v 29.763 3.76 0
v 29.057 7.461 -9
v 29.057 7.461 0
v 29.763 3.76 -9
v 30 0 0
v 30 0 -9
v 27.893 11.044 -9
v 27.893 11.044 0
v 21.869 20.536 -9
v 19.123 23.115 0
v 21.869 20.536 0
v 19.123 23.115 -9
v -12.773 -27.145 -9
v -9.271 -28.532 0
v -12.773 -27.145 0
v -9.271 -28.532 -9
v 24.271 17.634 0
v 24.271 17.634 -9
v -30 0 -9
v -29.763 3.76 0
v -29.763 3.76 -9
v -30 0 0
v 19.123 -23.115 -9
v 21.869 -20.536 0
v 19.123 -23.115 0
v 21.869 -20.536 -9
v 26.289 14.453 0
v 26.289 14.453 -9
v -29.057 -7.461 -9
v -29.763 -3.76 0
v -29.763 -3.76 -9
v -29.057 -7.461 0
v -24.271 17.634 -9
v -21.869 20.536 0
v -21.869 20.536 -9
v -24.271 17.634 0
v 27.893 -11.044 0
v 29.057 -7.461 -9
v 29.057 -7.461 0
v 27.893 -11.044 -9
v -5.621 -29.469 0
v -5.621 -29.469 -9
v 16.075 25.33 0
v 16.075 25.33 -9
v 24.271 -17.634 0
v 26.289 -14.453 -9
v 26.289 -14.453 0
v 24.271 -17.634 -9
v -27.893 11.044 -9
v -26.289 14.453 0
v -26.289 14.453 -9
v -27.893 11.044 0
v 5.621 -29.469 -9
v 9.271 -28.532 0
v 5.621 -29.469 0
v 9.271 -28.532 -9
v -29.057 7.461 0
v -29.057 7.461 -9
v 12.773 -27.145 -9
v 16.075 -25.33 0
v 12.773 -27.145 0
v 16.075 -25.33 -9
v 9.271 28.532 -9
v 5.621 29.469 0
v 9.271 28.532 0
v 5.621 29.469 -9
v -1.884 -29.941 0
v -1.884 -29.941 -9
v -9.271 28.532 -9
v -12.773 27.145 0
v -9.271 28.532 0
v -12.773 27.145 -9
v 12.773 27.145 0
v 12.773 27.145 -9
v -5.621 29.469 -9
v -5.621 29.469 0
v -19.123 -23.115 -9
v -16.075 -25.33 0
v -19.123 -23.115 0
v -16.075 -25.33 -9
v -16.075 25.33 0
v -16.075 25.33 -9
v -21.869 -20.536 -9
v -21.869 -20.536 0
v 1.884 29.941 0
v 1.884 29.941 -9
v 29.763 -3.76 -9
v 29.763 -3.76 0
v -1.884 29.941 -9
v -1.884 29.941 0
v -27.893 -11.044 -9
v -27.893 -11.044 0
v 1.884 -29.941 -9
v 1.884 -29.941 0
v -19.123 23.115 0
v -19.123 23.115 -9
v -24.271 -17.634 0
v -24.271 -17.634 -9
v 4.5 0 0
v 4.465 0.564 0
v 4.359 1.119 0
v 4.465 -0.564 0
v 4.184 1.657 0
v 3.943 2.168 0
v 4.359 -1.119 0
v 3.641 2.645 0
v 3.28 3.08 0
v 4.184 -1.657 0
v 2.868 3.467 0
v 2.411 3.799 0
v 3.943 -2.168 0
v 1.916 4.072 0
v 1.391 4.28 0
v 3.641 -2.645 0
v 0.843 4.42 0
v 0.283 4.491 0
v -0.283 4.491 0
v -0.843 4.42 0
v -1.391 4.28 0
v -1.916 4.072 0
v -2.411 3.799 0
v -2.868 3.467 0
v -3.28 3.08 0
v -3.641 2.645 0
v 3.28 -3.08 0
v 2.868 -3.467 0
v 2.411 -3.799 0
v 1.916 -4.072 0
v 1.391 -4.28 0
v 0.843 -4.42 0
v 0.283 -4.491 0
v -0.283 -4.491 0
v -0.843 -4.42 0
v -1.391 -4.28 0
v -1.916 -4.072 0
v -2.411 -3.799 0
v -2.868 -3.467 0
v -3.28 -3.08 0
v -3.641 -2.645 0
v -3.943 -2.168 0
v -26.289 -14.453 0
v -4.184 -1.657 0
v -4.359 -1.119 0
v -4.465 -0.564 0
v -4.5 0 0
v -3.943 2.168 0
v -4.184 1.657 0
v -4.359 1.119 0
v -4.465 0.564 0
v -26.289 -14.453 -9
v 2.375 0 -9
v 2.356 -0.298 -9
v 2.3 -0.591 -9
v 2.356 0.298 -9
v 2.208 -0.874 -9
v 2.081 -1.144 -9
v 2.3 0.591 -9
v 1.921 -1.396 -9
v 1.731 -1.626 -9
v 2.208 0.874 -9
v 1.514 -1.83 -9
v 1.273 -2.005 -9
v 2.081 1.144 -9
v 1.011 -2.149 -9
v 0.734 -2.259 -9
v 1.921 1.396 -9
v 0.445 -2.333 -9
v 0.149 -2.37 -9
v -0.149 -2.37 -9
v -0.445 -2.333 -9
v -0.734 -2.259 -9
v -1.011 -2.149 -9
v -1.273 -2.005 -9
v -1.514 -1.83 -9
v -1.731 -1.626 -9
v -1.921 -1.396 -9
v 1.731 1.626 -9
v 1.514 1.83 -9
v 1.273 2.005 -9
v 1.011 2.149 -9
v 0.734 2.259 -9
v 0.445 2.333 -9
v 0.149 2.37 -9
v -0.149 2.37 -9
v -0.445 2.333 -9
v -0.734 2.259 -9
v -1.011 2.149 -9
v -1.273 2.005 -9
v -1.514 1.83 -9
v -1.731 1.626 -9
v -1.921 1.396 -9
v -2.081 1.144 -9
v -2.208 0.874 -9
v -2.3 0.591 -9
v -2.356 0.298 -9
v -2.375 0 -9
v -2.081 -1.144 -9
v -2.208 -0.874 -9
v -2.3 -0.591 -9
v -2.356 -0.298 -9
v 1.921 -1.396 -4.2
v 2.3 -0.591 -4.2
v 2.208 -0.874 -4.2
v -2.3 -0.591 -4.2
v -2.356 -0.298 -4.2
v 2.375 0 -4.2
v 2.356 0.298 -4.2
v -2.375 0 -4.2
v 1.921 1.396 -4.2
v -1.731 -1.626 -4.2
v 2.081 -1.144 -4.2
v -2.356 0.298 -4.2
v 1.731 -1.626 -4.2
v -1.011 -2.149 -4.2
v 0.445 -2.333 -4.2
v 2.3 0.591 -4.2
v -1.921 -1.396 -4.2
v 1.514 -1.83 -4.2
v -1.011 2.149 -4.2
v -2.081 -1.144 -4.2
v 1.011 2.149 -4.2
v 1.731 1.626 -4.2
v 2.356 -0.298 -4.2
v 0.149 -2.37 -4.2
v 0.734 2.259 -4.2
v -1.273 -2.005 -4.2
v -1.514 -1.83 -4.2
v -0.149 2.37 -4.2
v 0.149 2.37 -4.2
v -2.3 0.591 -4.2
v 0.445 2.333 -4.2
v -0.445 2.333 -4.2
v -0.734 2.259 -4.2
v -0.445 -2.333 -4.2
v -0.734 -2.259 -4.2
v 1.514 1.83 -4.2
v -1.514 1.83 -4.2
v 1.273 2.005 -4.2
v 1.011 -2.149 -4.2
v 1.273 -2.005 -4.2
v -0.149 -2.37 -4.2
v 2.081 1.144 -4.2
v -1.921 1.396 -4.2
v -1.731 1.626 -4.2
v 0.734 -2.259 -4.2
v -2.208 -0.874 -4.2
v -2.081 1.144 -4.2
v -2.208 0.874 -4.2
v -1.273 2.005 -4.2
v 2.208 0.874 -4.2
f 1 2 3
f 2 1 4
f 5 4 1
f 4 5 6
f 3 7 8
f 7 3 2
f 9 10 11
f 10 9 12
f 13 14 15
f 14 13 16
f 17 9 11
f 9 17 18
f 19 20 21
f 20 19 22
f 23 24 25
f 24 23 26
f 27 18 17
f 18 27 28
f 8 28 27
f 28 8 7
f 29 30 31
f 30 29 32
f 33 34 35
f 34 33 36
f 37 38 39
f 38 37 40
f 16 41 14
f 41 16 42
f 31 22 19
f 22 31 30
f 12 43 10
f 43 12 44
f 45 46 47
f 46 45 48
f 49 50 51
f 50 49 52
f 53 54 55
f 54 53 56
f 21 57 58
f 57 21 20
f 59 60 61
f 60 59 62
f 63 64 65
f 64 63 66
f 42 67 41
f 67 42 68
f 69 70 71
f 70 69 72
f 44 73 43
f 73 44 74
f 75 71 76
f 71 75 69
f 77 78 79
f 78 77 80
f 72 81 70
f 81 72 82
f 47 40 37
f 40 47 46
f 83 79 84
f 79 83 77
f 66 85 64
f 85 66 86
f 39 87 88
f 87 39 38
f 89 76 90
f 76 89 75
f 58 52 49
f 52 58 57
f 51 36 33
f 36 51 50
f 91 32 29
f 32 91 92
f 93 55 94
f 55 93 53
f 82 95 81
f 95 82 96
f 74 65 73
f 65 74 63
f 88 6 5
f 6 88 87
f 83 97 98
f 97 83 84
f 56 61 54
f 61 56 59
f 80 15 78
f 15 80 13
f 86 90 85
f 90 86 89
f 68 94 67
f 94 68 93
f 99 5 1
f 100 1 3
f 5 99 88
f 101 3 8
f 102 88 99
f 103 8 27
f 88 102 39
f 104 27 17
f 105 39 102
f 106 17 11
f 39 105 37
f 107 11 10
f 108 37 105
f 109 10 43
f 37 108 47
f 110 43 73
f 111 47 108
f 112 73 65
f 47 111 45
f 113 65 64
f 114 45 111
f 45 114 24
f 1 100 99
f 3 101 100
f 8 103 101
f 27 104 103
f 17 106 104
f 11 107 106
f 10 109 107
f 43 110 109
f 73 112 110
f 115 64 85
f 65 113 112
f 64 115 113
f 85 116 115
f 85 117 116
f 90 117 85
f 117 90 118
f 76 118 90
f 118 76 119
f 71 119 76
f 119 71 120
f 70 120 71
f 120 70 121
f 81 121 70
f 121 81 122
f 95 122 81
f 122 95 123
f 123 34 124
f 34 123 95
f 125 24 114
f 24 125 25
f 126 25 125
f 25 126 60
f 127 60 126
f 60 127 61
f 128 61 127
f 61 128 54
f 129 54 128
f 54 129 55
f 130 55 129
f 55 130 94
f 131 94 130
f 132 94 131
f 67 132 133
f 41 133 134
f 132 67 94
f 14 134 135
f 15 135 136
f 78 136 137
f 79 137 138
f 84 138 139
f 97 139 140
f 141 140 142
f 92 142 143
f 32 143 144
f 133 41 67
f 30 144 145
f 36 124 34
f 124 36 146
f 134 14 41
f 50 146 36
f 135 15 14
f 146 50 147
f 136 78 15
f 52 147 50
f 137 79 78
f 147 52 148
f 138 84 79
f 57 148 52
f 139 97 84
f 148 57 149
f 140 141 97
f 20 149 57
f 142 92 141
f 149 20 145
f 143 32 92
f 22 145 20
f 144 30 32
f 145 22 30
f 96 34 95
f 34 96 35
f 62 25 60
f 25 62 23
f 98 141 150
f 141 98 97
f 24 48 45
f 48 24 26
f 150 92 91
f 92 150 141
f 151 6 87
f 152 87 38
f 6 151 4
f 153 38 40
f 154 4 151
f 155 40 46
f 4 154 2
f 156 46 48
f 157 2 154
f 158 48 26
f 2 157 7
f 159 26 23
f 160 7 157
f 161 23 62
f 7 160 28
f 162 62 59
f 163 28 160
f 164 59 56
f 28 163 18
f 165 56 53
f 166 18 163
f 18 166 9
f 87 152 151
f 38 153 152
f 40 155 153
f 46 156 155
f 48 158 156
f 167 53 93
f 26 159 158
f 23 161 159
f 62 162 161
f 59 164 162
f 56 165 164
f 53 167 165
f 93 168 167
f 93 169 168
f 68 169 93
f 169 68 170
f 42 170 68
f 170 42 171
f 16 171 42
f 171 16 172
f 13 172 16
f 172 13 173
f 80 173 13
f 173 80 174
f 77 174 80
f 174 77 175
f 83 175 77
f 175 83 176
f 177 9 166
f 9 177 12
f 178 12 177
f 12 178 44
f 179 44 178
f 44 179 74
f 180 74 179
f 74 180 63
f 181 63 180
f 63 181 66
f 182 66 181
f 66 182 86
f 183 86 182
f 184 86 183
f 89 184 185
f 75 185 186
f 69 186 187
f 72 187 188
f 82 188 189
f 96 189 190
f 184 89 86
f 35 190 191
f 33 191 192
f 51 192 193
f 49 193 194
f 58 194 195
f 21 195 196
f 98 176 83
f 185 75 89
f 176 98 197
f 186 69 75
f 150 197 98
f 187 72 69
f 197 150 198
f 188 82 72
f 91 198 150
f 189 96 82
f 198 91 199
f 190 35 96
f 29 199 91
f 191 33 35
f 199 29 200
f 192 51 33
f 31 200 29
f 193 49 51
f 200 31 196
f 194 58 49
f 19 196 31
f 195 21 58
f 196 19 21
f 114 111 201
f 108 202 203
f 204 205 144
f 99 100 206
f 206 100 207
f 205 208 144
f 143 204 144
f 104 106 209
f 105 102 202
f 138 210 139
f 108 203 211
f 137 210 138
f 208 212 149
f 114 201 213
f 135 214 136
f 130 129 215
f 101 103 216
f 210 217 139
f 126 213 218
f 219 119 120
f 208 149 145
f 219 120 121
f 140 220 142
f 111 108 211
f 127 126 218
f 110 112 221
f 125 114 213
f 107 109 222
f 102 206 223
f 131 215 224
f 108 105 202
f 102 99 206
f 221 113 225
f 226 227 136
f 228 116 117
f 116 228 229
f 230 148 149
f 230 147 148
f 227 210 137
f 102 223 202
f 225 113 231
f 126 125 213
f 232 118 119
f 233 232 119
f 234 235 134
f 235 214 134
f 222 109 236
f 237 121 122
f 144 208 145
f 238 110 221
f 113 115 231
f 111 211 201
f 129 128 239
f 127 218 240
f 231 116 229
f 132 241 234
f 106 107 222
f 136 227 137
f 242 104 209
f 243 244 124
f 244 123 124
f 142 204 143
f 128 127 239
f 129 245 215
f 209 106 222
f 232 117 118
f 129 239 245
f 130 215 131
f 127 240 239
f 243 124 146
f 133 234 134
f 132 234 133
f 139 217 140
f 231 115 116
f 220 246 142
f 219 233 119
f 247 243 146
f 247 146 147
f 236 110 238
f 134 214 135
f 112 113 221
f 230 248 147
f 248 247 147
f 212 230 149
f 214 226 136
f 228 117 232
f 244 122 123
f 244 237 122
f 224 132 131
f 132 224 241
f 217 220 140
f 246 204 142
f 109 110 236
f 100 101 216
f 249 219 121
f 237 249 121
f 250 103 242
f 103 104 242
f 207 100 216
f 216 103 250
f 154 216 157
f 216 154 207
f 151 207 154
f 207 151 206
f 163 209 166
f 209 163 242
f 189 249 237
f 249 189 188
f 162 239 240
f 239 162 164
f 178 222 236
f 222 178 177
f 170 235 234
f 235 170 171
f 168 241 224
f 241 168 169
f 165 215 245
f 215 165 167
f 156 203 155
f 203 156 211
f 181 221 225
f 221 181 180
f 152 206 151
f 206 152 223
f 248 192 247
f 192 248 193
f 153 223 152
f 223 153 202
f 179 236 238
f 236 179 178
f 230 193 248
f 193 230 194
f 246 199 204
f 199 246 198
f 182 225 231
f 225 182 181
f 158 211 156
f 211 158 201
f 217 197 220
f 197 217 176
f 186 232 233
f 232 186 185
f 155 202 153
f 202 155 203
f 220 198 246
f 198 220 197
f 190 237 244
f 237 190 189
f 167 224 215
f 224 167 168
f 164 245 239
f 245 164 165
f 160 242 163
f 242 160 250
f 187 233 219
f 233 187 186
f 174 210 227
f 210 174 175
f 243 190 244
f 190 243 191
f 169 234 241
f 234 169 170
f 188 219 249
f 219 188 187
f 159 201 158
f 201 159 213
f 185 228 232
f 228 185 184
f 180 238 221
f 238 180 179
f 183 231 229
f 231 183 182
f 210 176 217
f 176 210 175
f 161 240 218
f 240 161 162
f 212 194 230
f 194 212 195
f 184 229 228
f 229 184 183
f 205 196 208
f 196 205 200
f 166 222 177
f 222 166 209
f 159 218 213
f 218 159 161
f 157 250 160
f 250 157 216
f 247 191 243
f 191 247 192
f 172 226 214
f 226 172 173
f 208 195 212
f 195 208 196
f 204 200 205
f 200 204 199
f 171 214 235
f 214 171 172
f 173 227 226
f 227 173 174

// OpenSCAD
$fn = 50;


difference() {
	union() {
		translate(v = [0, 0, -9.0000000000]) {
			cylinder(h = 9, r = 30.0000000000);
		}
		translate(v = [0, 0, -9.0000000000]) {
			cylinder(h = 9, r = 2.8750000000);
		}
	}
	union() {
		translate(v = [0, 0, 0]) {
			rotate(a = [0, 0, 0]) {
				difference() {
					union() {
						#translate(v = [0, 0, -9.0000000000]) {
							cylinder(h = 9, r = 2.2500000000);
						}
						#translate(v = [0, 0, -4.2000000000]) {
							cylinder(h = 4.2000000000, r1 = 2.3750000000, r2 = 4.5000000000);
						}
						#translate(v = [0, 0, -9.0000000000]) {
							cylinder(h = 9, r = 2.3750000000);
						}
						#translate(v = [0, 0, -9.0000000000]) {
							cylinder(h = 9, r = 2.2500000000);
						}
					}
					union();
				}
			}
		}
	}
}
